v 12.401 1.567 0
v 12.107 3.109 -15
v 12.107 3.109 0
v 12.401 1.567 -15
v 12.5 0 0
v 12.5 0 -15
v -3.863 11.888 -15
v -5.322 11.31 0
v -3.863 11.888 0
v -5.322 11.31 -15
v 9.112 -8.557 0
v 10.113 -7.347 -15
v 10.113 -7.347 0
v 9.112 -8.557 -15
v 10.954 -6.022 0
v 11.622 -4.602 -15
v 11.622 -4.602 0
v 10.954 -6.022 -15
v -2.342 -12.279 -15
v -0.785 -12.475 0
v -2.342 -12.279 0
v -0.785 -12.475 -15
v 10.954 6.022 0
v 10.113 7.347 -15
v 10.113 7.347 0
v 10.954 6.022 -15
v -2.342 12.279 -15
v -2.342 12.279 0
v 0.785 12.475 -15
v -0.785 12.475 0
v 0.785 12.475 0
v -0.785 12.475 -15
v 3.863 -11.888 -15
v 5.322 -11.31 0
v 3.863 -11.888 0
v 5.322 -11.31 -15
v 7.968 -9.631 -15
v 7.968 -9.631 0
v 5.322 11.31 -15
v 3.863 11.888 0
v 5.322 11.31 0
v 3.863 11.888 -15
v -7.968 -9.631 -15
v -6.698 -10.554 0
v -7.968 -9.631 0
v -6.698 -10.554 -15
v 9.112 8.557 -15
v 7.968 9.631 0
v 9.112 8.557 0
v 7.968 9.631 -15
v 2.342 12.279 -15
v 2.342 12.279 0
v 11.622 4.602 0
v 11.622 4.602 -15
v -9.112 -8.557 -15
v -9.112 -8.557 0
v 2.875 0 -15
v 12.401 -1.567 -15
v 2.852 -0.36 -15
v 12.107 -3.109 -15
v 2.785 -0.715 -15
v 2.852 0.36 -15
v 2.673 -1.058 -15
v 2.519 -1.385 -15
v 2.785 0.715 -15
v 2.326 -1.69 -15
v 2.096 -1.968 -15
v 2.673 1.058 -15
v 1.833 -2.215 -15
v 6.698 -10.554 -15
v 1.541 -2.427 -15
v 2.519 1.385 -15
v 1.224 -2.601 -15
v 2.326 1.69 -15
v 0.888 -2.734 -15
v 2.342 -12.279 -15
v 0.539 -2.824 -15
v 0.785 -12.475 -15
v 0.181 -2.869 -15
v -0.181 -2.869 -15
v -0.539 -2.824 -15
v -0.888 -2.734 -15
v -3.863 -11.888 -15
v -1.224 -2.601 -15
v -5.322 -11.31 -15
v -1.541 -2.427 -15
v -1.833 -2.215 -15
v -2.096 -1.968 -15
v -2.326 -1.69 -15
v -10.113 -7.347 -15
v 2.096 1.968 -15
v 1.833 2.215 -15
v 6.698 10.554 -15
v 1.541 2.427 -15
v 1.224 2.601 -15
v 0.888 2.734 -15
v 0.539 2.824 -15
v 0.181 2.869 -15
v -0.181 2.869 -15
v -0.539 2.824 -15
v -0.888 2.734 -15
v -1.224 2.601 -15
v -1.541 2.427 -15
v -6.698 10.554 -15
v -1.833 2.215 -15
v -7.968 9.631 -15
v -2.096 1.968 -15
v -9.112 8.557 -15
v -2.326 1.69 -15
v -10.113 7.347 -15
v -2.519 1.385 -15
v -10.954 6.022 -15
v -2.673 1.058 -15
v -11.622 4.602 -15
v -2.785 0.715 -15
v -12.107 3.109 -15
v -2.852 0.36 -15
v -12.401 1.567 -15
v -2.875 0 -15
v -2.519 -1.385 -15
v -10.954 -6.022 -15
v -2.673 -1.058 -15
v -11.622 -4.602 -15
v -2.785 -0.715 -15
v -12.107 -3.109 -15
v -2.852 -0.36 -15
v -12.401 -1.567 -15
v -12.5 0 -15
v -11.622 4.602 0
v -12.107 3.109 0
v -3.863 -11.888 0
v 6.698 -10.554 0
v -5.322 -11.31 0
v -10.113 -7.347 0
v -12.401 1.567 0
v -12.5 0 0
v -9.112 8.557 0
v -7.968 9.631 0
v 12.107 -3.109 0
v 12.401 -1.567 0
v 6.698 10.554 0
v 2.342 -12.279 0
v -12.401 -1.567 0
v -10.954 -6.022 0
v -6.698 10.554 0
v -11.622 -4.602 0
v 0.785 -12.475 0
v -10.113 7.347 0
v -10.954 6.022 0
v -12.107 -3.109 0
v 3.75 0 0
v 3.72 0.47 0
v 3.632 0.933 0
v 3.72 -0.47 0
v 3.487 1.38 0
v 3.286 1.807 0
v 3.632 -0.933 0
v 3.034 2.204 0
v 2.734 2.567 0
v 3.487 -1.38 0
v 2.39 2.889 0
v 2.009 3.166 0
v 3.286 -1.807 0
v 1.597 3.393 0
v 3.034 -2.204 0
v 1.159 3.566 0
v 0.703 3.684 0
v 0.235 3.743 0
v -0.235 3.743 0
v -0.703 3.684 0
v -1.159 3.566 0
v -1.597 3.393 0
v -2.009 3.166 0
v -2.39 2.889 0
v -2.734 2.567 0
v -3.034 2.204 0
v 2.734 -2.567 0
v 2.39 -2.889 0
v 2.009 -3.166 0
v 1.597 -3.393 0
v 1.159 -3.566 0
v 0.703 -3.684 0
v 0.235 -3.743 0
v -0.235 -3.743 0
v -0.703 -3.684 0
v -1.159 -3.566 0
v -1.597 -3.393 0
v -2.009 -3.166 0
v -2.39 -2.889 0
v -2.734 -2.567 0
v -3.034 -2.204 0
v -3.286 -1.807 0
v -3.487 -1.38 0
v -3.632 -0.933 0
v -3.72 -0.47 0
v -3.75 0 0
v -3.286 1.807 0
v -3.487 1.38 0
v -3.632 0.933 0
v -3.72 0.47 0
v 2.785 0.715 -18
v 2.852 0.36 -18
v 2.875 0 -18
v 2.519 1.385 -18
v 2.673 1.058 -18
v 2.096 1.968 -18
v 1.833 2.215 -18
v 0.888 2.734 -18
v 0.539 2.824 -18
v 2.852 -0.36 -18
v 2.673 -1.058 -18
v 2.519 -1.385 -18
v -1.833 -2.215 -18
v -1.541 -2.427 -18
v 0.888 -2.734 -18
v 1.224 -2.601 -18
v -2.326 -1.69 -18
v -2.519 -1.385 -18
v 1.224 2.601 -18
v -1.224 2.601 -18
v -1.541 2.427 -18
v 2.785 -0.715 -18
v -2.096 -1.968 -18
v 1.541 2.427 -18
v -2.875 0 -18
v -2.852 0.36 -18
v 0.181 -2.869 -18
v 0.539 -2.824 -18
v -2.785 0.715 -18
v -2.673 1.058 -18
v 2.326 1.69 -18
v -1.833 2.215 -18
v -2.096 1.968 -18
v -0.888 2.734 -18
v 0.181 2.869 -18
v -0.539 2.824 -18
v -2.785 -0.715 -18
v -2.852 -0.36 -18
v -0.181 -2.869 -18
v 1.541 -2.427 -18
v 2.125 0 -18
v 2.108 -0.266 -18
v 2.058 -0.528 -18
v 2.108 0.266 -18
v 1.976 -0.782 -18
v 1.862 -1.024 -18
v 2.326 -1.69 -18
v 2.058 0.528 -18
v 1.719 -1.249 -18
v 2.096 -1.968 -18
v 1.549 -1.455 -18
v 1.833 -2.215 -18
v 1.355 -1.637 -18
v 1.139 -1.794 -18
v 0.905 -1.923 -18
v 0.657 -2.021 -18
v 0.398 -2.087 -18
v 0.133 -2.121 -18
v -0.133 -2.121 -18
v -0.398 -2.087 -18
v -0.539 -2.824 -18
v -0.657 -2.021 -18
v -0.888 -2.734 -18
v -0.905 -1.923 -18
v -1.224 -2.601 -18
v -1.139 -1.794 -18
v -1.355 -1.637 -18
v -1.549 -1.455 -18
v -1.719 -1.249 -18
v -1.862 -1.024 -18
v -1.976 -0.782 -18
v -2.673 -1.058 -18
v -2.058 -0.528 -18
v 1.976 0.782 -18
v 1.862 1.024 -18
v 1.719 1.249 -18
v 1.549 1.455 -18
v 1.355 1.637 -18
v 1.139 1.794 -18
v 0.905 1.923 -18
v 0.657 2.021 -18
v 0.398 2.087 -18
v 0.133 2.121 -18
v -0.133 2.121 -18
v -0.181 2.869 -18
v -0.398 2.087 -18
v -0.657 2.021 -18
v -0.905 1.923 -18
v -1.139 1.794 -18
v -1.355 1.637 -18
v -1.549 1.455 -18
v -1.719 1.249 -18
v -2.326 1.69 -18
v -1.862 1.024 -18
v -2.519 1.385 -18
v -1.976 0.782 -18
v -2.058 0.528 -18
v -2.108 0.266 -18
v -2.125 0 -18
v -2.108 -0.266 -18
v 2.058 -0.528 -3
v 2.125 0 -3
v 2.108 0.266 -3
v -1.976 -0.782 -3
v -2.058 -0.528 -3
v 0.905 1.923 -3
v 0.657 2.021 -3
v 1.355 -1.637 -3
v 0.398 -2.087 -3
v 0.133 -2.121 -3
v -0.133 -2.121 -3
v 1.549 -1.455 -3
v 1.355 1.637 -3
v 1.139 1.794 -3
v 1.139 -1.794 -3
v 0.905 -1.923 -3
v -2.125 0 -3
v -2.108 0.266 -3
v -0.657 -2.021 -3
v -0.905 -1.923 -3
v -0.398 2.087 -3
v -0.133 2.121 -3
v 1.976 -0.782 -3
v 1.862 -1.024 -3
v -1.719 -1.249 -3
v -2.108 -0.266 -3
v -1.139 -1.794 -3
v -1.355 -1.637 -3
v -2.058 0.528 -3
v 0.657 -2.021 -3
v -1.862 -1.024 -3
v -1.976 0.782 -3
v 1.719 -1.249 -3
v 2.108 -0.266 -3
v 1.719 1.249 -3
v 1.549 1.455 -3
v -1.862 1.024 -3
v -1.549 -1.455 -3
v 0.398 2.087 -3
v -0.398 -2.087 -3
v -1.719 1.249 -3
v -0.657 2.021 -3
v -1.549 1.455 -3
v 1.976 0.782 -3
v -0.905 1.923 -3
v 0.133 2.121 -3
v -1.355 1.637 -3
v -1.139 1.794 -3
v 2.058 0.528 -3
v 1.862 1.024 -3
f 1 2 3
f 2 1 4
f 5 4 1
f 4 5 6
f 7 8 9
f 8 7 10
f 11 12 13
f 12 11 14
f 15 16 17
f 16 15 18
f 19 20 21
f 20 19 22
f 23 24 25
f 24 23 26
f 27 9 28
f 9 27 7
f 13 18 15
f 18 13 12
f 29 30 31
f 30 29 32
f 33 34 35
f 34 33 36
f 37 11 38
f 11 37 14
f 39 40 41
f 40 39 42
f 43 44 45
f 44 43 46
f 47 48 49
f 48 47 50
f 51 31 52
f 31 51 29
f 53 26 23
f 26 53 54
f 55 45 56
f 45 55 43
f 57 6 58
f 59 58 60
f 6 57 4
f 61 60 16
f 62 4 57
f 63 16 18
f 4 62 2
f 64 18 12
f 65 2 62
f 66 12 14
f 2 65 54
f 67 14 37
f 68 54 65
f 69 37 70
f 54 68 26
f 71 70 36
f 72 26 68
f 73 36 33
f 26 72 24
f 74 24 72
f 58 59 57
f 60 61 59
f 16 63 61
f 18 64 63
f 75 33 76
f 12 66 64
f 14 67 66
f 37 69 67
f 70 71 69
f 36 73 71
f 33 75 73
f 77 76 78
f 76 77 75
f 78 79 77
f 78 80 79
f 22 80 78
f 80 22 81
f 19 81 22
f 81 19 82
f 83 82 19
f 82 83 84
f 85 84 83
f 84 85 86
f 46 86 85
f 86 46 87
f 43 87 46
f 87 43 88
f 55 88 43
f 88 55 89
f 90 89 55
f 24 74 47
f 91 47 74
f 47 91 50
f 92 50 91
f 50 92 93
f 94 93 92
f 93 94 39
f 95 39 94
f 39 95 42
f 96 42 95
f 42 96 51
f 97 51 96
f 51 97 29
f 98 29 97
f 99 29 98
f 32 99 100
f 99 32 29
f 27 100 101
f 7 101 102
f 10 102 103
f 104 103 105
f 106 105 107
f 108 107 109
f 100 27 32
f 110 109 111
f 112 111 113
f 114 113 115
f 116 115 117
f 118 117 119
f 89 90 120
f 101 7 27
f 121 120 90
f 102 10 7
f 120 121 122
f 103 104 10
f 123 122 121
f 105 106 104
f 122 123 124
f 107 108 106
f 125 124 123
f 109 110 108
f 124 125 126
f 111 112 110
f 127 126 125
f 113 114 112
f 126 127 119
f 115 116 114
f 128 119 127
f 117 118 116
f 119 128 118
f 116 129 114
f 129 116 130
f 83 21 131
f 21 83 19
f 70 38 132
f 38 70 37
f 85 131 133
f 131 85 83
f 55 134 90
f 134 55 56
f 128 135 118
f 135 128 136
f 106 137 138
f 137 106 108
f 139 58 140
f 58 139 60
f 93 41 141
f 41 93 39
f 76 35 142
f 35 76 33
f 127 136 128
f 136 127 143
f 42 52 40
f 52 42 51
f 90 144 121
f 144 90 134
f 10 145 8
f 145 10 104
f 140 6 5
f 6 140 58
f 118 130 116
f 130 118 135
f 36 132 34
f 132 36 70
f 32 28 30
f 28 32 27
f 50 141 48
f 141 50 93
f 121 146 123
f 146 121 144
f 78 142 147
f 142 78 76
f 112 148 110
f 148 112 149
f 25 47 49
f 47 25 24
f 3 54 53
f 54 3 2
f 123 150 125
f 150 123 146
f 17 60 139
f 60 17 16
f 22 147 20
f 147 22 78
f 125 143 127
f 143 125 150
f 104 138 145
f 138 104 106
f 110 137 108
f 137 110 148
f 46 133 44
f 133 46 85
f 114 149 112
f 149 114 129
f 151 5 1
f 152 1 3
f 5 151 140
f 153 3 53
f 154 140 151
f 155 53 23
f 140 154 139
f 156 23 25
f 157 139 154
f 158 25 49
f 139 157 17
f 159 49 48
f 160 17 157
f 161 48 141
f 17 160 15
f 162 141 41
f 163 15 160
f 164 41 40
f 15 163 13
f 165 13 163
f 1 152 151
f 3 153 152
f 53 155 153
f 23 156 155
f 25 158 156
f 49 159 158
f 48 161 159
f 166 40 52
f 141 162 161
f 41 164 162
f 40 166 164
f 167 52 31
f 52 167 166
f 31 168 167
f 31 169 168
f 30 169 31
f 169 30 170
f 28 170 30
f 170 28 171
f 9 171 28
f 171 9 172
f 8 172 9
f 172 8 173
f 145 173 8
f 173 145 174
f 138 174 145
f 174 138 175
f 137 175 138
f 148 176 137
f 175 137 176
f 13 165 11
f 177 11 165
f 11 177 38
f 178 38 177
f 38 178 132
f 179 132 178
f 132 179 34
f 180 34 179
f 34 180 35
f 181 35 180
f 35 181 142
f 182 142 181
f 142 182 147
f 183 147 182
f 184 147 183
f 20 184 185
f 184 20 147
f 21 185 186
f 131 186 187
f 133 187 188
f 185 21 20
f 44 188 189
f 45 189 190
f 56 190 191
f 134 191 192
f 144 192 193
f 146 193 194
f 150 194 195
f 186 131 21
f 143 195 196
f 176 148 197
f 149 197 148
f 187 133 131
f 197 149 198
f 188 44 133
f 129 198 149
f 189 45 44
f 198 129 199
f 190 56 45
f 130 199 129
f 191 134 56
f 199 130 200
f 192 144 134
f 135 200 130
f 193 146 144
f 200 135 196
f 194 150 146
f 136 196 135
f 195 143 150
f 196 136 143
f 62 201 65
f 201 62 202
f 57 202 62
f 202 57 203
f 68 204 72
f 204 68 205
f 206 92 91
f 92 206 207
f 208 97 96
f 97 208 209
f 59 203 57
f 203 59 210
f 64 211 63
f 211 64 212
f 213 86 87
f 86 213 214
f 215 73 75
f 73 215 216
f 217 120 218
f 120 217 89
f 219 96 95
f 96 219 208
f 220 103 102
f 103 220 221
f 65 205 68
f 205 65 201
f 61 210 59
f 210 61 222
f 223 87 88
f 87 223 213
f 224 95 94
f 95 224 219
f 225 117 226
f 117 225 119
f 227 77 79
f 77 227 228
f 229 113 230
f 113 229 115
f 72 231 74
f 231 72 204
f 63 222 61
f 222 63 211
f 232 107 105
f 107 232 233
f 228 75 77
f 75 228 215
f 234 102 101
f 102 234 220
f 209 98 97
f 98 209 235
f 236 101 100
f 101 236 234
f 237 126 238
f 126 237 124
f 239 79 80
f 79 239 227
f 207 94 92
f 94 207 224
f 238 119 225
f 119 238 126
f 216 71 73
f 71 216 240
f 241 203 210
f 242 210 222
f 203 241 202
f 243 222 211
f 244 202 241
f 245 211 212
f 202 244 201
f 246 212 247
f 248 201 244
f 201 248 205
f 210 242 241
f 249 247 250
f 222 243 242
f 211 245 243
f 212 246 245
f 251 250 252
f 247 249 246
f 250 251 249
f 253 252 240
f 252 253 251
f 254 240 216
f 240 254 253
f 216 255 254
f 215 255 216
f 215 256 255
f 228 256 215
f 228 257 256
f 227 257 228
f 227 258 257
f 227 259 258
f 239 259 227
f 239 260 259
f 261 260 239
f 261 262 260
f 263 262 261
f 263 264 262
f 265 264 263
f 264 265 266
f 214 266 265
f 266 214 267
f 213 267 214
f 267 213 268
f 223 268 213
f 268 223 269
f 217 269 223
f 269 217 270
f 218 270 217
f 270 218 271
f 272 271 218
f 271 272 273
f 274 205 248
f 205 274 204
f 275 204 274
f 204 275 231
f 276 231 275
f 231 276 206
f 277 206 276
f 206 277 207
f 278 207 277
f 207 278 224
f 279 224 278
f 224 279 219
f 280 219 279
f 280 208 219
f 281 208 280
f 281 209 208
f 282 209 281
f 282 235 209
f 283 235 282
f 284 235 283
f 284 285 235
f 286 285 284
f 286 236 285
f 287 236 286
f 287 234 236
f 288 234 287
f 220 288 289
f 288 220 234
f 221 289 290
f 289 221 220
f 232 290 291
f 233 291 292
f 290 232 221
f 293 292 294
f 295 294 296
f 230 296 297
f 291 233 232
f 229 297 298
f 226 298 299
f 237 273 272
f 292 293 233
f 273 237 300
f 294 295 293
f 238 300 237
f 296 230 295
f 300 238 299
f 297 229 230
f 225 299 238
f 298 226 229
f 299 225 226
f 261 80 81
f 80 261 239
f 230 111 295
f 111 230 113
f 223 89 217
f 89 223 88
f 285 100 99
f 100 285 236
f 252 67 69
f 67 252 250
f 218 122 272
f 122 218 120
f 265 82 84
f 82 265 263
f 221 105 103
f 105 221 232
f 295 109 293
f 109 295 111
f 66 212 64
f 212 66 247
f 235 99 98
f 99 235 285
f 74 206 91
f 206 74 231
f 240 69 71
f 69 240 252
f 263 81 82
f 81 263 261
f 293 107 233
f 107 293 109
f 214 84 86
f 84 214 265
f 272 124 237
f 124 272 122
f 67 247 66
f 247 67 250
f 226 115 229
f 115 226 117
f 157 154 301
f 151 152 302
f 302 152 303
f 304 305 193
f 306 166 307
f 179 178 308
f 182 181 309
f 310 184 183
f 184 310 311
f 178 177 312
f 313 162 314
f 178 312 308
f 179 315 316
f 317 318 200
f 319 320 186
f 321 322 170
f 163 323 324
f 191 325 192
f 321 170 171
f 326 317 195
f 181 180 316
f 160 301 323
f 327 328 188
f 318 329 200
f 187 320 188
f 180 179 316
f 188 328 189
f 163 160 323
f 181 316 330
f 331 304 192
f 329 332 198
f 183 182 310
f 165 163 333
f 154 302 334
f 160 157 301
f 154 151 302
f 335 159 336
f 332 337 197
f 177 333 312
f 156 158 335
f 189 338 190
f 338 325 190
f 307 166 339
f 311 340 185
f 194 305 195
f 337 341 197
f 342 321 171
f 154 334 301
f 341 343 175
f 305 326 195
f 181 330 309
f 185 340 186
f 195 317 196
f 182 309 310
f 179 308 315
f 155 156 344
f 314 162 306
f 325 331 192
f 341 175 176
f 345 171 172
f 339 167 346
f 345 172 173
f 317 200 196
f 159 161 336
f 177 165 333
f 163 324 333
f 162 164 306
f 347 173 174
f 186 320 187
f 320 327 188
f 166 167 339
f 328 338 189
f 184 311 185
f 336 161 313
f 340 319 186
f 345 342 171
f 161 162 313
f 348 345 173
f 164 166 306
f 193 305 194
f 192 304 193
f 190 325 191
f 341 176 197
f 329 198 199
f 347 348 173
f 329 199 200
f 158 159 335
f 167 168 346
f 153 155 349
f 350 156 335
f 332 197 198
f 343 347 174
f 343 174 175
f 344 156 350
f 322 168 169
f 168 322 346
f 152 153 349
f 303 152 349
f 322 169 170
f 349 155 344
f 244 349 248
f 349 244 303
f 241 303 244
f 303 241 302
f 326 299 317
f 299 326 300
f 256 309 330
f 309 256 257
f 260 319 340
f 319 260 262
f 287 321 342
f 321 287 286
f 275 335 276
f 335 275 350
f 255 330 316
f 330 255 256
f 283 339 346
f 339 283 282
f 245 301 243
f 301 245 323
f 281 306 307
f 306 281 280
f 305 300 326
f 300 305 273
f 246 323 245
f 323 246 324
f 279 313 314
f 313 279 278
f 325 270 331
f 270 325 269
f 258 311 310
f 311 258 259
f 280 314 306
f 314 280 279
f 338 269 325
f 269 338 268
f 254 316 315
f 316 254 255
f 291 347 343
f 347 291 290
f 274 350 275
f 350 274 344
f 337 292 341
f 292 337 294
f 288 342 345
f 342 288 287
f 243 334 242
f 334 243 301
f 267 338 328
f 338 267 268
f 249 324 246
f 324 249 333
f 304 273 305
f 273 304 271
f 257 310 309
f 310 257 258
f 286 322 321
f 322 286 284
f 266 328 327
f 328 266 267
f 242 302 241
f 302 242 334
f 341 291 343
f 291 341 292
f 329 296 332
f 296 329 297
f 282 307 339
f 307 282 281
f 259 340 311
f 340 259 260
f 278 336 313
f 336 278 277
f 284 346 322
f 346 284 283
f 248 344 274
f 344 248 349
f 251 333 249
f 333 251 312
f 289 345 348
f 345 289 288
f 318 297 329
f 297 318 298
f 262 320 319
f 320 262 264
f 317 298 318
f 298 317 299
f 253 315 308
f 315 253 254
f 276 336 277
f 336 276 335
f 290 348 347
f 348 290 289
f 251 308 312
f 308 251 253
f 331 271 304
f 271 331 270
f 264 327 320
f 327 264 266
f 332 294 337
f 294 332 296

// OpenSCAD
$fn = 50;

difference() {
	union() {
		translate(v = [0, 0, -15.0]) {
			cylinder(h = 15, r = 12.5);
		}
		#translate(v = [0, 0, -18.0]) {
			cylinder(h = 18, r = 2.875);
		}
	}
	union() {
		translate(v = [0, 0, 0]) {
			rotate(a = [0, 0, 0]) {
				difference() {
					union() {
						translate(v = [0, 0, -18.0]) {
							cylinder(h = 18, r = 2.0);
						}
						translate(v = [0, 0, -3]) {
							cylinder(h = 3, r1 = 2.125, r2 = 3.75);
						}
						translate(v = [0, 0, -18.0]) {
							cylinder(h = 18, r = 2.125);
						}
						translate(v = [0, 0, -18.0]) {
							cylinder(h = 18, r = 2.0);
						}
					}
					union();
				}
			}
		}
	}
}
